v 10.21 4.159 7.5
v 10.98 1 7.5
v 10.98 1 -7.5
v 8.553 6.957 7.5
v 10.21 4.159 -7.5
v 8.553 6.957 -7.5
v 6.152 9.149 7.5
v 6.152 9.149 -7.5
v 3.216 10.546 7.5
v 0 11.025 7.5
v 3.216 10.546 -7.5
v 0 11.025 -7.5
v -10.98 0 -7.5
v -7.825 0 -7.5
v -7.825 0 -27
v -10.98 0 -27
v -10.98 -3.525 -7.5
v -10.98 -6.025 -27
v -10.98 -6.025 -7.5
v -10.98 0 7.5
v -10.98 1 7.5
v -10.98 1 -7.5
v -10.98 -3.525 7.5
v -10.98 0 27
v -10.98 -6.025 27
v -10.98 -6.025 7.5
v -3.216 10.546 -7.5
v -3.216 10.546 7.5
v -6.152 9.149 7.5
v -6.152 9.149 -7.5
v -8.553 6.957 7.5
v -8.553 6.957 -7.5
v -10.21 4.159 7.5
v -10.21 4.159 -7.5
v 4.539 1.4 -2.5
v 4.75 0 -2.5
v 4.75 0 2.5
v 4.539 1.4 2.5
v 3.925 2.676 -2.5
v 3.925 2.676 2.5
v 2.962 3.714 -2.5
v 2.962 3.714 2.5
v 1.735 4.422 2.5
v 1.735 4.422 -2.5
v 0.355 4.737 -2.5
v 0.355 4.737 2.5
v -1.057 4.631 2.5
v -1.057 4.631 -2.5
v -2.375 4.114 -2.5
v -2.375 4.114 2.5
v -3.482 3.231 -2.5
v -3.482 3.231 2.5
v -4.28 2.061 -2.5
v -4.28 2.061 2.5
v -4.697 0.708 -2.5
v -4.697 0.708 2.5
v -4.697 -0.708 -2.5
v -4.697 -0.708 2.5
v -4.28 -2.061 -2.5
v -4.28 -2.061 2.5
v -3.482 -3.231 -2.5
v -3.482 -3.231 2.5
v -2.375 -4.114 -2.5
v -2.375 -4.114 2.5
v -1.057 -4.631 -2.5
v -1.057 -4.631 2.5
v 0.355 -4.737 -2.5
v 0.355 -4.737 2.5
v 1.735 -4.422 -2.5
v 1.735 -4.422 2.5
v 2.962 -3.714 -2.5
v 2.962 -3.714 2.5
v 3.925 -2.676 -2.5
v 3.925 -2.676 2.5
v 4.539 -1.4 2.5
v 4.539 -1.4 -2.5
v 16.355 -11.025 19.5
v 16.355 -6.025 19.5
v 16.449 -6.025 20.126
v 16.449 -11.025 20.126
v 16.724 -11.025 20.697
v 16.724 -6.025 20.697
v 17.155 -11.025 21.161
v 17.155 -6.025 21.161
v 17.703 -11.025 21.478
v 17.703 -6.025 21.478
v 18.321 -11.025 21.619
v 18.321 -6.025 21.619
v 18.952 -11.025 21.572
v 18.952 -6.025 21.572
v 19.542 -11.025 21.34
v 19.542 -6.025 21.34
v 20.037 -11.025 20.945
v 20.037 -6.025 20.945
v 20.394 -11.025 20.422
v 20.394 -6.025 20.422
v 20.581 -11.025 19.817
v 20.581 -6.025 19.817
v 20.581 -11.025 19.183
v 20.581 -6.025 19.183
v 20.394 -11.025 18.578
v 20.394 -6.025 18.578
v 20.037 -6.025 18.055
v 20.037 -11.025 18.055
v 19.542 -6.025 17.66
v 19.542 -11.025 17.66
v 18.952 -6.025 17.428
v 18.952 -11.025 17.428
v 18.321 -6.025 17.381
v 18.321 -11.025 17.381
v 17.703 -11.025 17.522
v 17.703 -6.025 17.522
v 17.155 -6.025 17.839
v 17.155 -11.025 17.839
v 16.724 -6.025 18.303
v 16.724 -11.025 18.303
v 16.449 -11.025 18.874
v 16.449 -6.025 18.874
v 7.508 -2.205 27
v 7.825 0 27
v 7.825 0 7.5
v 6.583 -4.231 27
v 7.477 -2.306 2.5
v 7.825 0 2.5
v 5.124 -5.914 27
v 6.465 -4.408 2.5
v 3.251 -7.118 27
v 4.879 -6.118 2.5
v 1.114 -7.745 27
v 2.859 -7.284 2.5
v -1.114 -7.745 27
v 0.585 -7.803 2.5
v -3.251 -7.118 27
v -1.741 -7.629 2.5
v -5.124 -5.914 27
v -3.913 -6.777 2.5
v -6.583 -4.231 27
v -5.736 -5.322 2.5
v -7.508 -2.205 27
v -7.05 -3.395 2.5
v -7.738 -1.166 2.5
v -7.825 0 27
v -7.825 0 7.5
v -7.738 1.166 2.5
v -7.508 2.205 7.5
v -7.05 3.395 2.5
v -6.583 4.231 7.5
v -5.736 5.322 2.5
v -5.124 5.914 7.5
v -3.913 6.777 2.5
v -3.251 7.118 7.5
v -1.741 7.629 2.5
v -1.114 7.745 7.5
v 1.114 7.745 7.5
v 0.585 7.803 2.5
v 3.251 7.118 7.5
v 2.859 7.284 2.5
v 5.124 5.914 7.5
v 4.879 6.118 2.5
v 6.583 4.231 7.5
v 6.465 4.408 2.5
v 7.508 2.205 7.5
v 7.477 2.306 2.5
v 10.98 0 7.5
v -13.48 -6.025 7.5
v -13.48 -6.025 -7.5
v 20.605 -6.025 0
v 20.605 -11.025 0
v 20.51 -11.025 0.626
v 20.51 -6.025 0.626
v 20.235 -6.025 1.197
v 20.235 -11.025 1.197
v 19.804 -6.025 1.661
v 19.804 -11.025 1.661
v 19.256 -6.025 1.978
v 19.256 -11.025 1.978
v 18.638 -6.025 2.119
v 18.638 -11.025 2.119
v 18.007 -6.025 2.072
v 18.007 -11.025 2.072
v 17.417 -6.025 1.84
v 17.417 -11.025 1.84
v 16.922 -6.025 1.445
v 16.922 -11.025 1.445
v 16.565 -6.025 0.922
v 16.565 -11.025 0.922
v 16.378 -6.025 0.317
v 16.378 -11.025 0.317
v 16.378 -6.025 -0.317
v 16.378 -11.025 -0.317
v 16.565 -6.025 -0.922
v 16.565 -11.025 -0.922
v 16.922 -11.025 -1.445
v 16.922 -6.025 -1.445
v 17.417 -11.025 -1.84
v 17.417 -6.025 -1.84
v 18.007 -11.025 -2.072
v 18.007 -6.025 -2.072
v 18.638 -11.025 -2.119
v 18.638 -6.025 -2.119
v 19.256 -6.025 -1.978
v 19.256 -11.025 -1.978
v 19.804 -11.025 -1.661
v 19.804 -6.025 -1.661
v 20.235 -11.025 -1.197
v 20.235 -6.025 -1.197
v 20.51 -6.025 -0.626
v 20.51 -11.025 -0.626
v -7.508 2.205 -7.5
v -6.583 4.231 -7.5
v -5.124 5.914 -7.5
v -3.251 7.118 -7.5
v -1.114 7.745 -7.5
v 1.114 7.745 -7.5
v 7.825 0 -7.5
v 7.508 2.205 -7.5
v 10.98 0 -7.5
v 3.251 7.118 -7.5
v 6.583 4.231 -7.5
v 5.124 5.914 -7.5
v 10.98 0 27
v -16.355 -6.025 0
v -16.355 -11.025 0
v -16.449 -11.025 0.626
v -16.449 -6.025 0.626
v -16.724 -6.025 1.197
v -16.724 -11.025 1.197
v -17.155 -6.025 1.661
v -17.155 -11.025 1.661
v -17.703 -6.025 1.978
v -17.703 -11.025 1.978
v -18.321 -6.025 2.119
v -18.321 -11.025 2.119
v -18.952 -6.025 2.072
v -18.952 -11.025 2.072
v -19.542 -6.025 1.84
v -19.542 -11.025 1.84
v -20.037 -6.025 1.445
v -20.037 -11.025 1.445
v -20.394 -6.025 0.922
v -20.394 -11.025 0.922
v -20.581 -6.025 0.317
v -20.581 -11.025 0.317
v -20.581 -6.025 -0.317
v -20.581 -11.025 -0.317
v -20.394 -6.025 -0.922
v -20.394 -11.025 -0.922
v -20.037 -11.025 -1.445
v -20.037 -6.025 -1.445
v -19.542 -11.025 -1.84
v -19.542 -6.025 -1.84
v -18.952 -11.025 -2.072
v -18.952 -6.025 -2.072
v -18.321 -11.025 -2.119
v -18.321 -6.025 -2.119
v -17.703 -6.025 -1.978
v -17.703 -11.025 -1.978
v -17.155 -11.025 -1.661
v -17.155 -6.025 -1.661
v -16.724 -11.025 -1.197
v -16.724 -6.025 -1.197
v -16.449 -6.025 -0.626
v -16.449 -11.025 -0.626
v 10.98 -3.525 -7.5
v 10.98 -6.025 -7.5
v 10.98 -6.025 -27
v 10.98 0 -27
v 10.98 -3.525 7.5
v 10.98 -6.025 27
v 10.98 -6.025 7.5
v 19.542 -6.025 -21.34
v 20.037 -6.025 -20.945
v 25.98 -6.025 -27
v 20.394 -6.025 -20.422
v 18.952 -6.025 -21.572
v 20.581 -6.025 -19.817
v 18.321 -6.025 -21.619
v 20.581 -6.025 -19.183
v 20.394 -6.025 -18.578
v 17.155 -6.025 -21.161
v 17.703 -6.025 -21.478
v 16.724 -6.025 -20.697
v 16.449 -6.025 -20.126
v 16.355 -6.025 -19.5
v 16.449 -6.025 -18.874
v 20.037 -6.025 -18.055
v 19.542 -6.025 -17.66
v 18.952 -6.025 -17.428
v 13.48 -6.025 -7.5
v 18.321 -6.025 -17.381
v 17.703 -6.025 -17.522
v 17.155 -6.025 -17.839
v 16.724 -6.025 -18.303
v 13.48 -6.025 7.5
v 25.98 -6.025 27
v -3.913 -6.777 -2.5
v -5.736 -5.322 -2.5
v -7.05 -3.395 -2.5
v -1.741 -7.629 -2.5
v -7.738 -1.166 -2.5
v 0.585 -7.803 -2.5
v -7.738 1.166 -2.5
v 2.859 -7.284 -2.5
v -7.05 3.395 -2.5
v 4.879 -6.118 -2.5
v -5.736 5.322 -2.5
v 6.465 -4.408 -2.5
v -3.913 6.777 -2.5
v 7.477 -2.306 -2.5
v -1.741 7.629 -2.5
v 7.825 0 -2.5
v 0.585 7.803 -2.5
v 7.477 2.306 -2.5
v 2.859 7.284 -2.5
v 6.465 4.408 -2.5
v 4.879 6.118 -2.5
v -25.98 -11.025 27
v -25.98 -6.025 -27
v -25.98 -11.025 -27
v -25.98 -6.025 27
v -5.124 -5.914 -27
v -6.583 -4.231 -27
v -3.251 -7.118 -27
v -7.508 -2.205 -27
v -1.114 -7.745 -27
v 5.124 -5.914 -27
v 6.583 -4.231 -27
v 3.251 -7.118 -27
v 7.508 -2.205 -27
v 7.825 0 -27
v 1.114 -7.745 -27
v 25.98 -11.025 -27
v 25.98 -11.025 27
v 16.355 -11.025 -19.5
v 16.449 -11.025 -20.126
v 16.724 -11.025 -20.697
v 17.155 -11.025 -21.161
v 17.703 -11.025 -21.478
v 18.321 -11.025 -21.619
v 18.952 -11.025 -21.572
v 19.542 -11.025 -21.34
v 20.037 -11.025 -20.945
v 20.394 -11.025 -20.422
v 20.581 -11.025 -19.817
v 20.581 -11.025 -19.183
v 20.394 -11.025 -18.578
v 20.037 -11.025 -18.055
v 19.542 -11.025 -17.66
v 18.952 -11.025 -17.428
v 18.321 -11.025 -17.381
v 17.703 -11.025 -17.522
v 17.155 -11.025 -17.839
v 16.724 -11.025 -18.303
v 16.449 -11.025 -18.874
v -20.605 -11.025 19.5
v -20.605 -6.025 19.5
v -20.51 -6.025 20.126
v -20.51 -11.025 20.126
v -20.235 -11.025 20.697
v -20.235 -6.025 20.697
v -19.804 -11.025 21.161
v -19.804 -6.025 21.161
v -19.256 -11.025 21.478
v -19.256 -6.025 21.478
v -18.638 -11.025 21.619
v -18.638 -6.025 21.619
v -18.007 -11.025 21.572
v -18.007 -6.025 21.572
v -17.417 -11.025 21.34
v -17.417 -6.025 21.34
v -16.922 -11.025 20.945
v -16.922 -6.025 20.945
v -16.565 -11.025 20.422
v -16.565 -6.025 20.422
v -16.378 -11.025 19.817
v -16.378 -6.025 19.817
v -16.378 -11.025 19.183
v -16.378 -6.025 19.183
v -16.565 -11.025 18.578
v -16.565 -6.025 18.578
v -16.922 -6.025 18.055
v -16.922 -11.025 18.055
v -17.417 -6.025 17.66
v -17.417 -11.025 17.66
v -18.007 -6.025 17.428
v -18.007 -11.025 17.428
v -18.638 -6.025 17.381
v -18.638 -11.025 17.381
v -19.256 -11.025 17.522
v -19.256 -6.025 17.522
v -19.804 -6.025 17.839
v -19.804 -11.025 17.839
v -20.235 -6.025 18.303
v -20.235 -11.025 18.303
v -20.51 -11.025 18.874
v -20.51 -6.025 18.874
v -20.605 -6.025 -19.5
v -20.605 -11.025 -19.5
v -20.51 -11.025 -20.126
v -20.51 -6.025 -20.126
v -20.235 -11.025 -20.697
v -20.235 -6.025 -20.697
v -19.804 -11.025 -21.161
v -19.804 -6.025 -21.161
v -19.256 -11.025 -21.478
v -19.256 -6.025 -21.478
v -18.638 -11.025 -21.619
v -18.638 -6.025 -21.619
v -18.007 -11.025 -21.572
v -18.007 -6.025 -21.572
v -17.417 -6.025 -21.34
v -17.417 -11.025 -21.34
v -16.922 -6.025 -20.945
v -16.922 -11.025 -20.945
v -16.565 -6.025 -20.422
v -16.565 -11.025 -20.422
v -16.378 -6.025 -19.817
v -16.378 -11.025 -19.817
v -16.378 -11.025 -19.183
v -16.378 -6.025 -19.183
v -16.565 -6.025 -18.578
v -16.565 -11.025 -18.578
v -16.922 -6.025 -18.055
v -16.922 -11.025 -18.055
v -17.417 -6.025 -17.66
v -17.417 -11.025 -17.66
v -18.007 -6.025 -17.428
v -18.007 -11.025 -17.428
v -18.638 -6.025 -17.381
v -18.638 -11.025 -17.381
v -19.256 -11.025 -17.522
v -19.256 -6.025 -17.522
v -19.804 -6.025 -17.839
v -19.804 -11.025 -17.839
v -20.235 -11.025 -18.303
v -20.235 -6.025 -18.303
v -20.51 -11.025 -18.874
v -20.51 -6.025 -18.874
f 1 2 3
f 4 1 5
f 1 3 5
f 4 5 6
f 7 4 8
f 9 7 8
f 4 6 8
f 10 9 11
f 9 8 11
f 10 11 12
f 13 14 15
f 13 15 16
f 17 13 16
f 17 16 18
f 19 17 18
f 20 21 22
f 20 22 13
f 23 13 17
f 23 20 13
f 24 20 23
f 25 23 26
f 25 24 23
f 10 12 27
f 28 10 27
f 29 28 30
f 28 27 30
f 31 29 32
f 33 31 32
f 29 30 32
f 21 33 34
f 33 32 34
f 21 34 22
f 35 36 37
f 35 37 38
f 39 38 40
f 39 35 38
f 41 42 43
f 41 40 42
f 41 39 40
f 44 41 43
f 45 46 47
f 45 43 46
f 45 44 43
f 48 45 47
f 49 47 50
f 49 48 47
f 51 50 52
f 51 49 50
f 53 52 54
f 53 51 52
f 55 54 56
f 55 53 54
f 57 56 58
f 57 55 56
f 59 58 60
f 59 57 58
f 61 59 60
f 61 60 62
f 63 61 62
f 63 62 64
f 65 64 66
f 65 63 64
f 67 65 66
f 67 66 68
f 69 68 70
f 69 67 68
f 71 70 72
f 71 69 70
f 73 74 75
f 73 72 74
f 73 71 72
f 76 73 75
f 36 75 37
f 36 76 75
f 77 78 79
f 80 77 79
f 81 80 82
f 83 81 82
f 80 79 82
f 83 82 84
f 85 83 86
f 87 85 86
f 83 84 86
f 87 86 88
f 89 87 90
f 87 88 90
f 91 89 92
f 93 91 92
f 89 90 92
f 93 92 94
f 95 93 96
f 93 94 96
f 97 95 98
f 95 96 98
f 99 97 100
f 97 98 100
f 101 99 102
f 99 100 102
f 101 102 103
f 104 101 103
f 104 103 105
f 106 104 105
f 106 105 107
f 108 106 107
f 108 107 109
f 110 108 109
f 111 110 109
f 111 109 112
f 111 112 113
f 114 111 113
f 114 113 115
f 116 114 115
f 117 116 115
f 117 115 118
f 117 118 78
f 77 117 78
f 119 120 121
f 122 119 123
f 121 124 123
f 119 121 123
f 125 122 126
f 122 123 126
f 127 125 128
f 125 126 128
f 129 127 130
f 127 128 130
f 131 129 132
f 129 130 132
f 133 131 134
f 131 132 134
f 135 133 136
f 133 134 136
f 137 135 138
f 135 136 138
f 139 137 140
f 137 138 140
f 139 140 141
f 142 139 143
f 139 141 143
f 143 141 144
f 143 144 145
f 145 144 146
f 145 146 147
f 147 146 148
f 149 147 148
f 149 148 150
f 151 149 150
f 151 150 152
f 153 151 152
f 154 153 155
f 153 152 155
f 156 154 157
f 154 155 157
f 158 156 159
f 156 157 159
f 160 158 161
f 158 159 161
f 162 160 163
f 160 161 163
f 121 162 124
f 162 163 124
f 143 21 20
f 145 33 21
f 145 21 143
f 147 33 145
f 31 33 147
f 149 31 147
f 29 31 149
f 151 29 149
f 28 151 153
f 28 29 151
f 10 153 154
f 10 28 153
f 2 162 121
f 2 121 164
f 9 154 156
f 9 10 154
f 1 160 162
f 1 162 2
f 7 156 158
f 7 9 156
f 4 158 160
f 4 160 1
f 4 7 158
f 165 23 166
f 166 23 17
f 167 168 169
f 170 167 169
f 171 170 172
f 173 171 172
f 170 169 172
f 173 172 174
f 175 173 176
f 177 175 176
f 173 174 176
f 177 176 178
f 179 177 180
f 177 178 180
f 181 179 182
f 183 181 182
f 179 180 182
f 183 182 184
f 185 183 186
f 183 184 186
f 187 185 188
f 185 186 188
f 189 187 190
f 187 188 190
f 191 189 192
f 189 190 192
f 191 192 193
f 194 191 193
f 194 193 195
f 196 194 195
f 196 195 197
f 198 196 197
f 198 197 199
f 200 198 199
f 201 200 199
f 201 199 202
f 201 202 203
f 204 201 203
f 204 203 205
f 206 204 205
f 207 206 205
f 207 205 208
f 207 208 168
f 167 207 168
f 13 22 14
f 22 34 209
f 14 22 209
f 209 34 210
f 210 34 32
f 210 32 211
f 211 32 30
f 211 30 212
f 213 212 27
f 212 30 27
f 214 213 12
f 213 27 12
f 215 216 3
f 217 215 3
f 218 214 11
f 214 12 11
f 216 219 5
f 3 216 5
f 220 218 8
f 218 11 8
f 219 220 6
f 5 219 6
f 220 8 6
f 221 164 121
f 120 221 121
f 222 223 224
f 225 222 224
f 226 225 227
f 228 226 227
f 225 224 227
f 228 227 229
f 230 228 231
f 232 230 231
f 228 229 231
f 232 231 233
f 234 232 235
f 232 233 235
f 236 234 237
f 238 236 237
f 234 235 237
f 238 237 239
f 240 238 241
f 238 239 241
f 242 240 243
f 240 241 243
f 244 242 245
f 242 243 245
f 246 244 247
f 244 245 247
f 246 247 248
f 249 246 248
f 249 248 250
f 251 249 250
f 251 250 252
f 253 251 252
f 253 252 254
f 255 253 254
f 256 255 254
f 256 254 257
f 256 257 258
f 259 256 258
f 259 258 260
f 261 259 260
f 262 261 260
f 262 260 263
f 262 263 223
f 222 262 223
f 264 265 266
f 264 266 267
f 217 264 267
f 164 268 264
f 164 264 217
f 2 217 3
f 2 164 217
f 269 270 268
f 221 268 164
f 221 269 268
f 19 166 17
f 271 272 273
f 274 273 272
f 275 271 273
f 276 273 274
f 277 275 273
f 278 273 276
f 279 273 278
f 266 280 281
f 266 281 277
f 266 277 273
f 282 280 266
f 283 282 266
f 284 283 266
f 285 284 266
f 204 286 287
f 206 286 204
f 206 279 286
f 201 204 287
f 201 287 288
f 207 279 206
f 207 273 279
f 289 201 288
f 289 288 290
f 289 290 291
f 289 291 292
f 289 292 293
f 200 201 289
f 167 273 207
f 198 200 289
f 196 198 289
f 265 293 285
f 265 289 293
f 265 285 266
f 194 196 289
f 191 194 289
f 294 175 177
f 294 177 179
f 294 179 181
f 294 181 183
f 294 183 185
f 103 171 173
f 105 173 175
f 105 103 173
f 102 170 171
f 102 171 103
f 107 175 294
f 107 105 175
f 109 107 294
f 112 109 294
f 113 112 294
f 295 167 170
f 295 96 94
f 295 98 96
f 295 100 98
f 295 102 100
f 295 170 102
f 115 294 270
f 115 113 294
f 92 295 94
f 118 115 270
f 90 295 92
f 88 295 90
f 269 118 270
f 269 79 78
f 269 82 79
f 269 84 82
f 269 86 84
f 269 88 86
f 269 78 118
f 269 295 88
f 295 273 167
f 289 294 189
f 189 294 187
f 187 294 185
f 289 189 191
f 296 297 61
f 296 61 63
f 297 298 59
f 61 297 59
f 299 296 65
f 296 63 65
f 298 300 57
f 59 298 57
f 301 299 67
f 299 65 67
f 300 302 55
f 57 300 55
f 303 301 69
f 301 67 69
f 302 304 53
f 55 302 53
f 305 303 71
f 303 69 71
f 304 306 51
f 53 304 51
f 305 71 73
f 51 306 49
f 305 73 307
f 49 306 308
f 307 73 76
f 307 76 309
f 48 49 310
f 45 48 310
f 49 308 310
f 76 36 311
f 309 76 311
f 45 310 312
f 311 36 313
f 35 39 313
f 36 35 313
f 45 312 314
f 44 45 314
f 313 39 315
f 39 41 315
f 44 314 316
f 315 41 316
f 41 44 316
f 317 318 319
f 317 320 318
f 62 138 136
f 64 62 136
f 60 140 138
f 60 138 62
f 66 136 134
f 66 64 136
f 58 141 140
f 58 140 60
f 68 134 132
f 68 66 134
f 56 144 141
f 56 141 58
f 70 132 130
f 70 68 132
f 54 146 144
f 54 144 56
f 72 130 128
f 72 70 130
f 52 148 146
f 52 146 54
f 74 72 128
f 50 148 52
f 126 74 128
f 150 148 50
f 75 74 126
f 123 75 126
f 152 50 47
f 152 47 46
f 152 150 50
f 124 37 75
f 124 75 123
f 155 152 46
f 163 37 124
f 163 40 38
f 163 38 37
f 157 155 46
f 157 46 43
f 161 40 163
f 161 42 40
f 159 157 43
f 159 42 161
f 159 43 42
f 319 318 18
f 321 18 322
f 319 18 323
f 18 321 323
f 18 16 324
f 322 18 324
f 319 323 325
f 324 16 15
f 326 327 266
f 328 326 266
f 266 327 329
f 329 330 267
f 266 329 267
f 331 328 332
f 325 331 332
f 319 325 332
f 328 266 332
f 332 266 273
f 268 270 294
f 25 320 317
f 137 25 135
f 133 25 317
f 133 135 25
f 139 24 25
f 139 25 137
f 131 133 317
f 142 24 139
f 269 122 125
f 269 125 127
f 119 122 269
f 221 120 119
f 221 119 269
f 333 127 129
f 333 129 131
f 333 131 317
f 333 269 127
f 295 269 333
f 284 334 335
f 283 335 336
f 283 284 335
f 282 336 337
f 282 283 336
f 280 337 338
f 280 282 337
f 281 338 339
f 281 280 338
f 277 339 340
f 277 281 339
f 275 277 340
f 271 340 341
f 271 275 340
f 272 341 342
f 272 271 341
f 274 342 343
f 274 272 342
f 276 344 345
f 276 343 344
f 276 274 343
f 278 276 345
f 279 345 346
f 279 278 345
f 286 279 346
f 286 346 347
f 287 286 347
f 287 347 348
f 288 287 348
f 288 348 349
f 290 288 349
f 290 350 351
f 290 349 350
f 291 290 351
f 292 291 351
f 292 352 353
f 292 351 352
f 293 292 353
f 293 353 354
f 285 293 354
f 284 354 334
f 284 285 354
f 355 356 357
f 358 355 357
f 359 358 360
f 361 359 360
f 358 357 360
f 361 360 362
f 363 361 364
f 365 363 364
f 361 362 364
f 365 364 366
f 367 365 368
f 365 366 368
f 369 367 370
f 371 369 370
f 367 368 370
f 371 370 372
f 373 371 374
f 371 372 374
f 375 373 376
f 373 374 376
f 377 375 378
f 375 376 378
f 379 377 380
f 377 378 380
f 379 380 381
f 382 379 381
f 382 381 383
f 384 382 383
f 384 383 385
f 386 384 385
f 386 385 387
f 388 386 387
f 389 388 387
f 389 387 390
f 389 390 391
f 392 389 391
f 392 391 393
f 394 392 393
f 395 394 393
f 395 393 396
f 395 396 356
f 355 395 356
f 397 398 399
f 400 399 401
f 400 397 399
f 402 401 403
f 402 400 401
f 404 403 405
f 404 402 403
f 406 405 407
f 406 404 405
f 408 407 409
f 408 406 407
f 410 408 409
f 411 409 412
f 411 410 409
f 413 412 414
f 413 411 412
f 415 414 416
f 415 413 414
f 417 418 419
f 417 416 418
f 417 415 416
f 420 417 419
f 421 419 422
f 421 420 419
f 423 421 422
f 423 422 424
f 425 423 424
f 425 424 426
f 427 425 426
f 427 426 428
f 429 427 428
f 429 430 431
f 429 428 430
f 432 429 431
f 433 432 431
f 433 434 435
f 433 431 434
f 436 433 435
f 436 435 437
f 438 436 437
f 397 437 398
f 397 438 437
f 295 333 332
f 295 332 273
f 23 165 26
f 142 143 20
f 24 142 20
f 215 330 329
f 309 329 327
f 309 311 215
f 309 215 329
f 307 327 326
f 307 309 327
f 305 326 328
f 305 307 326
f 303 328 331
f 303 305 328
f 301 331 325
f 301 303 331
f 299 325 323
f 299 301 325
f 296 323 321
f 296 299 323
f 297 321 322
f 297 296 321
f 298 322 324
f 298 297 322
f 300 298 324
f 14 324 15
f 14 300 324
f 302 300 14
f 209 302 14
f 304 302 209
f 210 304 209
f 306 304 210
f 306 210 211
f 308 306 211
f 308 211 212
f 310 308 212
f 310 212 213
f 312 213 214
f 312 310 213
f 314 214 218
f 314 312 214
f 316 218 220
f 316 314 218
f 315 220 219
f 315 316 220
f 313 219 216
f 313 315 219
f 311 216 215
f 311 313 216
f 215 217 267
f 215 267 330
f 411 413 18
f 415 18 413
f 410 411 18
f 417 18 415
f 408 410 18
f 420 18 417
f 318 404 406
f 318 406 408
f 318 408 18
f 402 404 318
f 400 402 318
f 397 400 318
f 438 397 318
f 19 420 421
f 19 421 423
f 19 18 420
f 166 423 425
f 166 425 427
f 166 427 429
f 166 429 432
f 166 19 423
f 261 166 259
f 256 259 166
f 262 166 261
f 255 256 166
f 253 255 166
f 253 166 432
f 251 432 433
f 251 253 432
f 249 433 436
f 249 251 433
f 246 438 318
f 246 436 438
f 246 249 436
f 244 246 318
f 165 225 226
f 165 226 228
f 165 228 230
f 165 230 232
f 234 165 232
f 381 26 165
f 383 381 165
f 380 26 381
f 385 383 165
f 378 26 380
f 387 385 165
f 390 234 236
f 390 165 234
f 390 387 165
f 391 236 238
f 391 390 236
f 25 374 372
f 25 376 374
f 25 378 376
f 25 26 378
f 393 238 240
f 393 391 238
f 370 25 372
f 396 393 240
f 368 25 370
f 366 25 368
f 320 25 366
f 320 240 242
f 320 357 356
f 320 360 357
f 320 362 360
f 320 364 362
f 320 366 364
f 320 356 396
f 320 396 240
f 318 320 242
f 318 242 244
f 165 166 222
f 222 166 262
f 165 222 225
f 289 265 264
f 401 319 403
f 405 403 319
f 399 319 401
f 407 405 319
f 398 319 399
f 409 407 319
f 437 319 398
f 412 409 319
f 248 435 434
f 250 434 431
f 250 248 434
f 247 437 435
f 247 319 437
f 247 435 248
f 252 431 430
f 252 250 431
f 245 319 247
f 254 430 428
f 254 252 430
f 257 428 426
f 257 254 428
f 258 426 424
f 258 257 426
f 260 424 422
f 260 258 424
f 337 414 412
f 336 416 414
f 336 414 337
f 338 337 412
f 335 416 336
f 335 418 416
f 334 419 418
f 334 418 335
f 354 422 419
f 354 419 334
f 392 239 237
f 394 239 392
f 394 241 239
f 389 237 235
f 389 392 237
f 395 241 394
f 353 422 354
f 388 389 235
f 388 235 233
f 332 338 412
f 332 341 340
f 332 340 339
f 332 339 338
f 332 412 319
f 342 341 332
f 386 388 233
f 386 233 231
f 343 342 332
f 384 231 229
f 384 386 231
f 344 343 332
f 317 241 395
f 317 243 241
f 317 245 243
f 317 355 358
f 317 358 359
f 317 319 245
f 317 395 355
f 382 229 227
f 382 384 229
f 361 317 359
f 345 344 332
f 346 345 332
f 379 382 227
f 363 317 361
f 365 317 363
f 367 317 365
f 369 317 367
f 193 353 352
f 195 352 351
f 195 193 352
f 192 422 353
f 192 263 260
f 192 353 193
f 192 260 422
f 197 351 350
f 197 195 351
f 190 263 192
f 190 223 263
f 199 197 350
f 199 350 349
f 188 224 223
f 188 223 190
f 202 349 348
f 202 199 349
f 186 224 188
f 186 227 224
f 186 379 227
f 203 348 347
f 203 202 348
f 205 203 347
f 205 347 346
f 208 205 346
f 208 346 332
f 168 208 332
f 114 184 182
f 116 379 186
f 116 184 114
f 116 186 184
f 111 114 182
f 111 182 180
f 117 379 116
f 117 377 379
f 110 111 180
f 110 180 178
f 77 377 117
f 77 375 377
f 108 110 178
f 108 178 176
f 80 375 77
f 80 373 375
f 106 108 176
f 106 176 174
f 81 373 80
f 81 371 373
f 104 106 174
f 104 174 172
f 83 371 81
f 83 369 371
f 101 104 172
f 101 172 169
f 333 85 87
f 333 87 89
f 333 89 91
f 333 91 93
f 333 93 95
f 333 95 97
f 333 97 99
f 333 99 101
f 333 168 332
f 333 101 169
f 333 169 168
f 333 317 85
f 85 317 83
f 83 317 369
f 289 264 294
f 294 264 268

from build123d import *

# Parameters (mm, degrees)
F0_R      = 4.75
F1_DEPTH  = 7.5
F2_R      = 2.125
F3_DEPTH  = 25
F4_R      = 7.825
F5_DEPTH  = 5
F6_SIZE   = 2.5
F8_DEPTH  = 19.5
F9_R      = 2.125
F10_DEPTH = 25


# Not quite as in the source:
# - a pattern or mirror of a feature is missing from the dataset's text; its kind, count and spacing are read off the source's solid


with BuildPart() as f1:
    # F0 (on Top) → F1 (new body, symmetric)
    with BuildSketch(Plane.XY):
        with BuildLine():
            Line((-25.9795548635, -11.025), (0, -11.025))
            Line((0, -11.025), (25.9795548635, -11.025))
            Line((25.9795548635, -11.025), (25.9795548635, -6.025))
            Line((25.9795548635, -6.025), (10.9795548635, -6.025))
            Line((10.9795548635, -6.025), (10.9795548635, 1))
            ThreePointArc((10.9795548635, 1), (7.4338961857, 8.1417327701), (0, 11.025))
            ThreePointArc((0, 11.025), (-7.4338961857, 8.1417327701), (-10.9795548635, 1))
            Line((-10.9795548635, 1), (-10.9795548635, -6.025))
            Line((-10.9795548635, -6.025), (-25.9795548635, -6.025))
            Line((-25.9795548635, -6.025), (-25.9795548635, -11.025))
        make_face()
        Circle(F0_R, mode=Mode.SUBTRACT)
    extrude(amount=F1_DEPTH, both=True)

    # F2 (on face) → F3 (cut)
    with BuildSketch(Plane.XZ.offset(11.025)):
        with Locations((-18.4795548635, 0)):
            Circle(F2_R)
        with Locations((18.4795548635, 0)):
            Circle(F2_R)
    extrude(amount=-F3_DEPTH, mode=Mode.SUBTRACT)

    # F4 (on face) → F5 (cut)
    with BuildSketch(Plane.XY.offset(7.5)):
        Circle(F4_R)
    f5 = extrude(amount=-F5_DEPTH, mode=Mode.SUBTRACT)

    # F5_copies: F5 across plane
    add(f5.mirror(Plane(origin=(0, 0, 0), x_dir=(-1, 0, 0), z_dir=(0, 0, -1))), mode=Mode.SUBTRACT)

    # F6
    f6_edges = [f1.edges().sort_by_distance(p)[0] for p in [
        (-10.979555, -6.025, 0),
        (10.979555, -6.025, 0),
    ]]
    chamfer(f6_edges, length=F6_SIZE)

    # F7 (on face) → F8 (join)
    with BuildSketch(Plane.XY.offset(7.5)):
        with BuildLine():
            Line((-25.9795548635, -11.025), (0, -11.025))
            Line((0, -11.025), (25.9795548635, -11.025))
            Line((25.9795548635, -11.025), (25.9795548635, -6.025))
            Line((25.9795548635, -6.025), (10.9795548635, -6.025))
            Line((10.9795548635, -6.025), (10.9795548635, 0))
            Line((10.9795548635, 0), (7.825, 0))
            ThreePointArc((7.825, 0), (0, -7.825), (-7.825, 0))
            Line((-7.825, 0), (-10.9795548635, 0))
            Line((-10.9795548635, 0), (-10.9795548635, -6.025))
            Line((-10.9795548635, -6.025), (-25.9795548635, -6.025))
            Line((-25.9795548635, -6.025), (-25.9795548635, -11.025))
        make_face()
    f8 = extrude(amount=F8_DEPTH)

    # F8_copies: F8 across plane
    add(f8.mirror(Plane(origin=(0, 0, 0), x_dir=(-1, 0, 0), z_dir=(0, 0, -1))))

    # F9 (on face) → F10 (cut)
    with BuildSketch(Plane(origin=(0, -6.025, 0), x_dir=(-1, 0, 0), z_dir=(0, 1, 0))):
        with Locations((-18.4795548635, 19.5)):
            Circle(F9_R)
        with Locations((18.4795548635, 19.5)):
            Circle(F9_R)
    f10 = extrude(amount=-F10_DEPTH, mode=Mode.SUBTRACT)

    # F10_copies: F10 across plane
    add(f10.mirror(Plane(origin=(0, 0, 0), x_dir=(-1, 0, 0), z_dir=(0, 0, -1))), mode=Mode.SUBTRACT)


solid = f1.part
